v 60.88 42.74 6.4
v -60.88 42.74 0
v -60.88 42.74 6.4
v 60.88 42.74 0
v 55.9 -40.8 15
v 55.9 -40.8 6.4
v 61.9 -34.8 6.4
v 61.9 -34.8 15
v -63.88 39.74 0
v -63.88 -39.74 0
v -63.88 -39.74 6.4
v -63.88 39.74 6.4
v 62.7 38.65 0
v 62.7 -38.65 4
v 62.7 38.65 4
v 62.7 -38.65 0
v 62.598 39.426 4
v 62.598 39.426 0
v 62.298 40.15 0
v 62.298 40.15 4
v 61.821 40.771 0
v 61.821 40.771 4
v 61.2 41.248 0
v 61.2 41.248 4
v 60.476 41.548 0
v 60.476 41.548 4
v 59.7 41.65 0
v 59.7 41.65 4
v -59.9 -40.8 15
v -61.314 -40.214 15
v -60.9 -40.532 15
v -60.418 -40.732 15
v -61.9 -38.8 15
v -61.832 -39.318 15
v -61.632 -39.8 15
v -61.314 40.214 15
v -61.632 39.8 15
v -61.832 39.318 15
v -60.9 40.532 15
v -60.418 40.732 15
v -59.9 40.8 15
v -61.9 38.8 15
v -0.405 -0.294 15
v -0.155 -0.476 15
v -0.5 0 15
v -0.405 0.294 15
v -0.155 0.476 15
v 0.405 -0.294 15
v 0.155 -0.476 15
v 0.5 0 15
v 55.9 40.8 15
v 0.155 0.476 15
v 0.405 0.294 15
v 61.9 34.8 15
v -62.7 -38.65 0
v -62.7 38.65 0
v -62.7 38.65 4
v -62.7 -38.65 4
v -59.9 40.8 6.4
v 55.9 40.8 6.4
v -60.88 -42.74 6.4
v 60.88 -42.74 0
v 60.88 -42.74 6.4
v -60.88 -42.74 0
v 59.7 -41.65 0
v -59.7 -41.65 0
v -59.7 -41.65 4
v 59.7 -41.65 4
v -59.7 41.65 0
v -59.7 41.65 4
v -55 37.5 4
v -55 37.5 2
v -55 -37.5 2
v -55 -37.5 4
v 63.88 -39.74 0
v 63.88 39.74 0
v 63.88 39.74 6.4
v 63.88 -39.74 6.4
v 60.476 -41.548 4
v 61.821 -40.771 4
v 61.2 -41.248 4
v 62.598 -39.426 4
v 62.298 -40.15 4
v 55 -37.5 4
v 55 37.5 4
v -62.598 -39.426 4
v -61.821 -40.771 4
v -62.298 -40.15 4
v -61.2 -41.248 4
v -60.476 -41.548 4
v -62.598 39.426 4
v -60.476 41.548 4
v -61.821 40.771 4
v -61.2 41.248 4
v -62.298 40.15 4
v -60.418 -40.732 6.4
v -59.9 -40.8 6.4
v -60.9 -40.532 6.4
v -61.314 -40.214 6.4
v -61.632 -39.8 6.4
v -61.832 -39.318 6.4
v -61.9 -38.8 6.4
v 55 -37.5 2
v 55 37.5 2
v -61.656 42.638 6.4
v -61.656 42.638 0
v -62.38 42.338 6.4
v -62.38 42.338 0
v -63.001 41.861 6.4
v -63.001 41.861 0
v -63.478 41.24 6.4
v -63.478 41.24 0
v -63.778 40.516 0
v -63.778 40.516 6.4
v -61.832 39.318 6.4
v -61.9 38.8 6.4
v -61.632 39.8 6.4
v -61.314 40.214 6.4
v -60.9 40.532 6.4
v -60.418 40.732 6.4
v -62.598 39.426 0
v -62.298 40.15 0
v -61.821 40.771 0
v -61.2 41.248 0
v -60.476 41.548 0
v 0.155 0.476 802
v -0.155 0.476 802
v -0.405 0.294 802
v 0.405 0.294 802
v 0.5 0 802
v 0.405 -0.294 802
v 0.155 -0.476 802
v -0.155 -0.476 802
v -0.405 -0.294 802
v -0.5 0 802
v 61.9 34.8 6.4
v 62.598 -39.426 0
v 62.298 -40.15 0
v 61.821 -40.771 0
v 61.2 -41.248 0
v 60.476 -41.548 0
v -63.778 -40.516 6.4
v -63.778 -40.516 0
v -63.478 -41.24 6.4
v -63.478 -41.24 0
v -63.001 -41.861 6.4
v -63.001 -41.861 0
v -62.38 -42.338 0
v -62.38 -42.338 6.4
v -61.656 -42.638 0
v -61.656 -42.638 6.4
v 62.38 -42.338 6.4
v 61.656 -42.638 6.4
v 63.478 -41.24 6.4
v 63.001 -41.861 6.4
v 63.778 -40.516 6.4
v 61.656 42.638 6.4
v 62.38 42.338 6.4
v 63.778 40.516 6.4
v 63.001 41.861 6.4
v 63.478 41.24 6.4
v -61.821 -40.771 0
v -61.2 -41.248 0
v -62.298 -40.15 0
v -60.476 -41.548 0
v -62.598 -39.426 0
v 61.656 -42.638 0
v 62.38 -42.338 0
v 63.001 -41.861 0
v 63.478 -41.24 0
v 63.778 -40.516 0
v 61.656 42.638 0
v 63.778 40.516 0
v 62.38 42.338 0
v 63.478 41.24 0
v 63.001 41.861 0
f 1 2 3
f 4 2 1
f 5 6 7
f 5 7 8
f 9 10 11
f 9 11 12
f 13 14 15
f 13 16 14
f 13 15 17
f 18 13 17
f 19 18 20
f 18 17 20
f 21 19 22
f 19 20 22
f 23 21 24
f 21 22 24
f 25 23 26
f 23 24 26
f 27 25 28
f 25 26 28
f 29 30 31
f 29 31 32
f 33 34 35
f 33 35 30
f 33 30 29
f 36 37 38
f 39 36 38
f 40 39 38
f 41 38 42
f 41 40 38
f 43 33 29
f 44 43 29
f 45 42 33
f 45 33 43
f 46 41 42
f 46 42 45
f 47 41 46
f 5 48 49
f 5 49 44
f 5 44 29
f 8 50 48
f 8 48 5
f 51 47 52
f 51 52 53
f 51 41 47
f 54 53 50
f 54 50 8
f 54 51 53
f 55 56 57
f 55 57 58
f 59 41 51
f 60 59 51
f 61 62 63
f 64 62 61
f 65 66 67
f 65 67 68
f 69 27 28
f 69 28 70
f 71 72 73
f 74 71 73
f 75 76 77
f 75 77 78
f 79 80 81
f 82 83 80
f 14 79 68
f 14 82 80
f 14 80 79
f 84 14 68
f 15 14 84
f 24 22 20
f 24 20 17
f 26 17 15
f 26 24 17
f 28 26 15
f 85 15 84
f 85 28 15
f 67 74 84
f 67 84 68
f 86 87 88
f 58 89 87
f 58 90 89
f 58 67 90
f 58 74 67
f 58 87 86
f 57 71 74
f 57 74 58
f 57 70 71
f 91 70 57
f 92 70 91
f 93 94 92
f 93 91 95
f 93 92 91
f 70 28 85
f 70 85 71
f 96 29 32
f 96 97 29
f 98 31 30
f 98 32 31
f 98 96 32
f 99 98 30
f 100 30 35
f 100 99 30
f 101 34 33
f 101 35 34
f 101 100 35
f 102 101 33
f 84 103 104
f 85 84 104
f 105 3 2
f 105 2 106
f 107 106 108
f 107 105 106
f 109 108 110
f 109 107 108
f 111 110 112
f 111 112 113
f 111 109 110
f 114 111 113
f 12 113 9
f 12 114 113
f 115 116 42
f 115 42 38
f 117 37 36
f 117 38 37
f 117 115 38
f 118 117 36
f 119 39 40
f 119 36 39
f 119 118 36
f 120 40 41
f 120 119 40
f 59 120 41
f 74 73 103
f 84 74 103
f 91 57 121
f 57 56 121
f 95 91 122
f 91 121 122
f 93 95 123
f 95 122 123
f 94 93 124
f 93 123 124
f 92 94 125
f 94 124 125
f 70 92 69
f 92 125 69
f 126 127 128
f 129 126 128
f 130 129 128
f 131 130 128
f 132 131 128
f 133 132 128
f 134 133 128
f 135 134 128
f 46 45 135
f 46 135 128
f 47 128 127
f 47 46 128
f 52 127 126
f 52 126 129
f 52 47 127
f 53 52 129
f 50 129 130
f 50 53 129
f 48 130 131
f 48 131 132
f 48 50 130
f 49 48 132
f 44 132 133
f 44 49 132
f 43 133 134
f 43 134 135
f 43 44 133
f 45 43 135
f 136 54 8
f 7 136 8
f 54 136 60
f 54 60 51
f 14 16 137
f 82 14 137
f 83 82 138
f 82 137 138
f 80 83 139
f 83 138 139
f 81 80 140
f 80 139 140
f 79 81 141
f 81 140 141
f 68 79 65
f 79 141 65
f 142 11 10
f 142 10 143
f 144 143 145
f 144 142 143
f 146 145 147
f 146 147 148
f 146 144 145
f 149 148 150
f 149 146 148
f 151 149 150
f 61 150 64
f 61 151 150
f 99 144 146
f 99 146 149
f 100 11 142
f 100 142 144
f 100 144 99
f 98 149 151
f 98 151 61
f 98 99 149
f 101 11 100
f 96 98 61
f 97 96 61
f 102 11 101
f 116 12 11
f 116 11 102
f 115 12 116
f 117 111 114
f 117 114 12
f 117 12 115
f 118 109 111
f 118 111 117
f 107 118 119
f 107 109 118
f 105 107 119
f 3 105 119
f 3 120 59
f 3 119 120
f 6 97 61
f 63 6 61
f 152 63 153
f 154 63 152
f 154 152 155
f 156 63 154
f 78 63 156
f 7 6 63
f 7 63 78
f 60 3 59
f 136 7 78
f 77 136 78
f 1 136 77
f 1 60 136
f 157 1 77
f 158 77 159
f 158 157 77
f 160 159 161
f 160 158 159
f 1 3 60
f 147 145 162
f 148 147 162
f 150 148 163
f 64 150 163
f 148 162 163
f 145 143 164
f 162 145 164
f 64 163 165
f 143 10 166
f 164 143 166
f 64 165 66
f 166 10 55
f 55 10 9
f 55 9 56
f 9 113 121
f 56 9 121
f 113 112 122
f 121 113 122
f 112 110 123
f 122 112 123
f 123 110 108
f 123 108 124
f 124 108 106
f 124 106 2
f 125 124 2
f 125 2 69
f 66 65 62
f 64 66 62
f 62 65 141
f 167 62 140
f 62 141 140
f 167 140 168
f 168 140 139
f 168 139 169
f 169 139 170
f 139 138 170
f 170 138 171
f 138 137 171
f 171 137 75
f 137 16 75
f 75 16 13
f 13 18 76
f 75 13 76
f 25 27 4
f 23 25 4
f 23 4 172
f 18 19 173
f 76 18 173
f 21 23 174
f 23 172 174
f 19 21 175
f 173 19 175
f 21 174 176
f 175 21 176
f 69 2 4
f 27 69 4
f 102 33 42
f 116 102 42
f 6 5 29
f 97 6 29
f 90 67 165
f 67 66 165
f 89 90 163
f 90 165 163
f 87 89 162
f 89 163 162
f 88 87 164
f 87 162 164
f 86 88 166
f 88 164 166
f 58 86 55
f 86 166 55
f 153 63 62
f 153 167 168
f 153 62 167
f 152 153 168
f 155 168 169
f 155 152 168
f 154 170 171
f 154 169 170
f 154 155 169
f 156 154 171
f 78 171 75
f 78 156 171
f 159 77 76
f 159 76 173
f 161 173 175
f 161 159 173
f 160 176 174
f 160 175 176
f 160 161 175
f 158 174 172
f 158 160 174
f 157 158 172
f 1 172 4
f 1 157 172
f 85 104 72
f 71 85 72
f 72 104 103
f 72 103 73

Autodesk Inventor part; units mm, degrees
ref_plane "YZ Plane" through (0, 0, 0) normal (1, 0, 0) x (0, 1, 0)
ref_plane "XZ Plane" through (0, 0, 0) normal (0, 1, 0) x (-1, 0, 0)
ref_plane "XY Plane" through (0, 0, 0) normal (0, 0, 1) x (1, 0, 0)
sketch "Sketch1" plane through (0, 0, 0) normal (0, 0, 1) x (1, 0, 0)
  line L0 (-63.88, 42.74) -> (63.88, 42.74)
  line L1 (63.88, 42.74) -> (63.88, -42.74)
  line L2 (63.88, -42.74) -> (-63.88, -42.74)
  line L3 (-63.88, -42.74) -> (-63.88, 42.74)
  line L4 (63.88, 42.74) -> (-63.88, -42.74) construction
  point P0 (0, 0)
  point P1 (0, 0)
  dimension "d0" = 127.76
  dimension "d1" = 85.48
extrude "Extrusion1" add sketch "Sketch1" along normal blind 15
sketch "Sketch2" plane through (0, 0, 0) normal (0, 0, -1) x (-1, 0, 0)
  line L0 (-62.7, 41.65) -> (62.7, 41.65)
  line L1 (62.7, 41.65) -> (62.7, -41.65)
  line L2 (62.7, -41.65) -> (-62.7, -41.65)
  line L3 (-62.7, -41.65) -> (-62.7, 41.65)
  line L4 (62.7, 41.65) -> (-62.7, -41.65) construction
  point P0 (0, 0)
  point P1 (0, 0)
  dimension "d4" = 125.4
  dimension "d5" = 83.3
extrude "Extrusion2" cut sketch "Sketch2" against normal blind 2
sketch "Sketch3" plane through (0, 0, 2) normal (0, 0, -1) x (-1, 0, 0)
  line L0 (-55, 37.5) -> (55, 37.5)
  line L1 (55, 37.5) -> (55, -37.5)
  line L2 (55, -37.5) -> (-55, -37.5)
  line L3 (-55, -37.5) -> (-55, 37.5)
  line L4 (55, 37.5) -> (-55, -37.5) construction
  line L5 (-62.7, 41.65) -> (62.7, 41.65) projected
  line L6 (-62.7, -41.65) -> (-62.7, 41.65) projected
  line L7 (62.7, -41.65) -> (-62.7, -41.65) projected
  line L8 (62.7, 41.65) -> (62.7, -41.65) projected
  point P0 (0, 0)
  point P1 (0, 0)
  dimension "d8" = 75
  dimension "d9" = 110
extrude "Extrusion3" cut sketch "Sketch3" against normal blind 2
sketch "Sketch4" plane through (0, 0, 15) normal (0, 0, 1) x (1, 0, 0)
  line L0 (61.9, -40.8) -> (-61.9, -40.8)
  line L1 (-61.9, -40.8) -> (-61.9, 40.8)
  line L2 (-61.9, 40.8) -> (61.9, 40.8)
  line L3 (61.9, 40.8) -> (61.9, -40.8)
  line L4 (-61.9, -40.8) -> (61.9, 40.8) construction
  line L5 (63.88, 42.74) -> (-63.88, 42.74) projected
  line L6 (-63.88, 42.74) -> (-63.88, -42.74) projected
  line L7 (-63.88, -42.74) -> (63.88, -42.74) projected
  line L8 (63.88, -42.74) -> (63.88, 42.74) projected
  point P0 (0, 0)
  point P1 (0, 0)
  dimension "d12" = 123.8
  dimension "d13" = 81.6
extrude "Extrusion4" cut sketch "Sketch4" against normal blind 8.6
fillet "Fillet1" radius 3 8 edges at (62.7, 41.65, 2) (-62.7, 41.65, 2) (-62.7, -41.65, 2) (62.7, -41.65, 2) (63.88, -42.74, 3.2) (63.88, 42.74, 3.2) (-63.88, 42.74, 3.2) (-63.88, -42.74, 3.2)
fillet "Fillet2" radius 2 2 edges at (-61.9, -40.8, 10.7) (-61.9, 40.8, 10.7)
chamfer "Chamfer1" distance 6 angle 45 2 edges at (61.9, -40.8, 10.7) (61.9, 40.8, 10.7)
sketch "Sketch6" plane through (0, 0, 2) normal (0, 0, -1) x (-1, 0, 0)
  circle A0 centre (0, 0) radius 0.5
  dimension "d21" = 1
extrude "Extrusion5" add sketch "Sketch6" against normal blind 800
properties part number "well_plate"
